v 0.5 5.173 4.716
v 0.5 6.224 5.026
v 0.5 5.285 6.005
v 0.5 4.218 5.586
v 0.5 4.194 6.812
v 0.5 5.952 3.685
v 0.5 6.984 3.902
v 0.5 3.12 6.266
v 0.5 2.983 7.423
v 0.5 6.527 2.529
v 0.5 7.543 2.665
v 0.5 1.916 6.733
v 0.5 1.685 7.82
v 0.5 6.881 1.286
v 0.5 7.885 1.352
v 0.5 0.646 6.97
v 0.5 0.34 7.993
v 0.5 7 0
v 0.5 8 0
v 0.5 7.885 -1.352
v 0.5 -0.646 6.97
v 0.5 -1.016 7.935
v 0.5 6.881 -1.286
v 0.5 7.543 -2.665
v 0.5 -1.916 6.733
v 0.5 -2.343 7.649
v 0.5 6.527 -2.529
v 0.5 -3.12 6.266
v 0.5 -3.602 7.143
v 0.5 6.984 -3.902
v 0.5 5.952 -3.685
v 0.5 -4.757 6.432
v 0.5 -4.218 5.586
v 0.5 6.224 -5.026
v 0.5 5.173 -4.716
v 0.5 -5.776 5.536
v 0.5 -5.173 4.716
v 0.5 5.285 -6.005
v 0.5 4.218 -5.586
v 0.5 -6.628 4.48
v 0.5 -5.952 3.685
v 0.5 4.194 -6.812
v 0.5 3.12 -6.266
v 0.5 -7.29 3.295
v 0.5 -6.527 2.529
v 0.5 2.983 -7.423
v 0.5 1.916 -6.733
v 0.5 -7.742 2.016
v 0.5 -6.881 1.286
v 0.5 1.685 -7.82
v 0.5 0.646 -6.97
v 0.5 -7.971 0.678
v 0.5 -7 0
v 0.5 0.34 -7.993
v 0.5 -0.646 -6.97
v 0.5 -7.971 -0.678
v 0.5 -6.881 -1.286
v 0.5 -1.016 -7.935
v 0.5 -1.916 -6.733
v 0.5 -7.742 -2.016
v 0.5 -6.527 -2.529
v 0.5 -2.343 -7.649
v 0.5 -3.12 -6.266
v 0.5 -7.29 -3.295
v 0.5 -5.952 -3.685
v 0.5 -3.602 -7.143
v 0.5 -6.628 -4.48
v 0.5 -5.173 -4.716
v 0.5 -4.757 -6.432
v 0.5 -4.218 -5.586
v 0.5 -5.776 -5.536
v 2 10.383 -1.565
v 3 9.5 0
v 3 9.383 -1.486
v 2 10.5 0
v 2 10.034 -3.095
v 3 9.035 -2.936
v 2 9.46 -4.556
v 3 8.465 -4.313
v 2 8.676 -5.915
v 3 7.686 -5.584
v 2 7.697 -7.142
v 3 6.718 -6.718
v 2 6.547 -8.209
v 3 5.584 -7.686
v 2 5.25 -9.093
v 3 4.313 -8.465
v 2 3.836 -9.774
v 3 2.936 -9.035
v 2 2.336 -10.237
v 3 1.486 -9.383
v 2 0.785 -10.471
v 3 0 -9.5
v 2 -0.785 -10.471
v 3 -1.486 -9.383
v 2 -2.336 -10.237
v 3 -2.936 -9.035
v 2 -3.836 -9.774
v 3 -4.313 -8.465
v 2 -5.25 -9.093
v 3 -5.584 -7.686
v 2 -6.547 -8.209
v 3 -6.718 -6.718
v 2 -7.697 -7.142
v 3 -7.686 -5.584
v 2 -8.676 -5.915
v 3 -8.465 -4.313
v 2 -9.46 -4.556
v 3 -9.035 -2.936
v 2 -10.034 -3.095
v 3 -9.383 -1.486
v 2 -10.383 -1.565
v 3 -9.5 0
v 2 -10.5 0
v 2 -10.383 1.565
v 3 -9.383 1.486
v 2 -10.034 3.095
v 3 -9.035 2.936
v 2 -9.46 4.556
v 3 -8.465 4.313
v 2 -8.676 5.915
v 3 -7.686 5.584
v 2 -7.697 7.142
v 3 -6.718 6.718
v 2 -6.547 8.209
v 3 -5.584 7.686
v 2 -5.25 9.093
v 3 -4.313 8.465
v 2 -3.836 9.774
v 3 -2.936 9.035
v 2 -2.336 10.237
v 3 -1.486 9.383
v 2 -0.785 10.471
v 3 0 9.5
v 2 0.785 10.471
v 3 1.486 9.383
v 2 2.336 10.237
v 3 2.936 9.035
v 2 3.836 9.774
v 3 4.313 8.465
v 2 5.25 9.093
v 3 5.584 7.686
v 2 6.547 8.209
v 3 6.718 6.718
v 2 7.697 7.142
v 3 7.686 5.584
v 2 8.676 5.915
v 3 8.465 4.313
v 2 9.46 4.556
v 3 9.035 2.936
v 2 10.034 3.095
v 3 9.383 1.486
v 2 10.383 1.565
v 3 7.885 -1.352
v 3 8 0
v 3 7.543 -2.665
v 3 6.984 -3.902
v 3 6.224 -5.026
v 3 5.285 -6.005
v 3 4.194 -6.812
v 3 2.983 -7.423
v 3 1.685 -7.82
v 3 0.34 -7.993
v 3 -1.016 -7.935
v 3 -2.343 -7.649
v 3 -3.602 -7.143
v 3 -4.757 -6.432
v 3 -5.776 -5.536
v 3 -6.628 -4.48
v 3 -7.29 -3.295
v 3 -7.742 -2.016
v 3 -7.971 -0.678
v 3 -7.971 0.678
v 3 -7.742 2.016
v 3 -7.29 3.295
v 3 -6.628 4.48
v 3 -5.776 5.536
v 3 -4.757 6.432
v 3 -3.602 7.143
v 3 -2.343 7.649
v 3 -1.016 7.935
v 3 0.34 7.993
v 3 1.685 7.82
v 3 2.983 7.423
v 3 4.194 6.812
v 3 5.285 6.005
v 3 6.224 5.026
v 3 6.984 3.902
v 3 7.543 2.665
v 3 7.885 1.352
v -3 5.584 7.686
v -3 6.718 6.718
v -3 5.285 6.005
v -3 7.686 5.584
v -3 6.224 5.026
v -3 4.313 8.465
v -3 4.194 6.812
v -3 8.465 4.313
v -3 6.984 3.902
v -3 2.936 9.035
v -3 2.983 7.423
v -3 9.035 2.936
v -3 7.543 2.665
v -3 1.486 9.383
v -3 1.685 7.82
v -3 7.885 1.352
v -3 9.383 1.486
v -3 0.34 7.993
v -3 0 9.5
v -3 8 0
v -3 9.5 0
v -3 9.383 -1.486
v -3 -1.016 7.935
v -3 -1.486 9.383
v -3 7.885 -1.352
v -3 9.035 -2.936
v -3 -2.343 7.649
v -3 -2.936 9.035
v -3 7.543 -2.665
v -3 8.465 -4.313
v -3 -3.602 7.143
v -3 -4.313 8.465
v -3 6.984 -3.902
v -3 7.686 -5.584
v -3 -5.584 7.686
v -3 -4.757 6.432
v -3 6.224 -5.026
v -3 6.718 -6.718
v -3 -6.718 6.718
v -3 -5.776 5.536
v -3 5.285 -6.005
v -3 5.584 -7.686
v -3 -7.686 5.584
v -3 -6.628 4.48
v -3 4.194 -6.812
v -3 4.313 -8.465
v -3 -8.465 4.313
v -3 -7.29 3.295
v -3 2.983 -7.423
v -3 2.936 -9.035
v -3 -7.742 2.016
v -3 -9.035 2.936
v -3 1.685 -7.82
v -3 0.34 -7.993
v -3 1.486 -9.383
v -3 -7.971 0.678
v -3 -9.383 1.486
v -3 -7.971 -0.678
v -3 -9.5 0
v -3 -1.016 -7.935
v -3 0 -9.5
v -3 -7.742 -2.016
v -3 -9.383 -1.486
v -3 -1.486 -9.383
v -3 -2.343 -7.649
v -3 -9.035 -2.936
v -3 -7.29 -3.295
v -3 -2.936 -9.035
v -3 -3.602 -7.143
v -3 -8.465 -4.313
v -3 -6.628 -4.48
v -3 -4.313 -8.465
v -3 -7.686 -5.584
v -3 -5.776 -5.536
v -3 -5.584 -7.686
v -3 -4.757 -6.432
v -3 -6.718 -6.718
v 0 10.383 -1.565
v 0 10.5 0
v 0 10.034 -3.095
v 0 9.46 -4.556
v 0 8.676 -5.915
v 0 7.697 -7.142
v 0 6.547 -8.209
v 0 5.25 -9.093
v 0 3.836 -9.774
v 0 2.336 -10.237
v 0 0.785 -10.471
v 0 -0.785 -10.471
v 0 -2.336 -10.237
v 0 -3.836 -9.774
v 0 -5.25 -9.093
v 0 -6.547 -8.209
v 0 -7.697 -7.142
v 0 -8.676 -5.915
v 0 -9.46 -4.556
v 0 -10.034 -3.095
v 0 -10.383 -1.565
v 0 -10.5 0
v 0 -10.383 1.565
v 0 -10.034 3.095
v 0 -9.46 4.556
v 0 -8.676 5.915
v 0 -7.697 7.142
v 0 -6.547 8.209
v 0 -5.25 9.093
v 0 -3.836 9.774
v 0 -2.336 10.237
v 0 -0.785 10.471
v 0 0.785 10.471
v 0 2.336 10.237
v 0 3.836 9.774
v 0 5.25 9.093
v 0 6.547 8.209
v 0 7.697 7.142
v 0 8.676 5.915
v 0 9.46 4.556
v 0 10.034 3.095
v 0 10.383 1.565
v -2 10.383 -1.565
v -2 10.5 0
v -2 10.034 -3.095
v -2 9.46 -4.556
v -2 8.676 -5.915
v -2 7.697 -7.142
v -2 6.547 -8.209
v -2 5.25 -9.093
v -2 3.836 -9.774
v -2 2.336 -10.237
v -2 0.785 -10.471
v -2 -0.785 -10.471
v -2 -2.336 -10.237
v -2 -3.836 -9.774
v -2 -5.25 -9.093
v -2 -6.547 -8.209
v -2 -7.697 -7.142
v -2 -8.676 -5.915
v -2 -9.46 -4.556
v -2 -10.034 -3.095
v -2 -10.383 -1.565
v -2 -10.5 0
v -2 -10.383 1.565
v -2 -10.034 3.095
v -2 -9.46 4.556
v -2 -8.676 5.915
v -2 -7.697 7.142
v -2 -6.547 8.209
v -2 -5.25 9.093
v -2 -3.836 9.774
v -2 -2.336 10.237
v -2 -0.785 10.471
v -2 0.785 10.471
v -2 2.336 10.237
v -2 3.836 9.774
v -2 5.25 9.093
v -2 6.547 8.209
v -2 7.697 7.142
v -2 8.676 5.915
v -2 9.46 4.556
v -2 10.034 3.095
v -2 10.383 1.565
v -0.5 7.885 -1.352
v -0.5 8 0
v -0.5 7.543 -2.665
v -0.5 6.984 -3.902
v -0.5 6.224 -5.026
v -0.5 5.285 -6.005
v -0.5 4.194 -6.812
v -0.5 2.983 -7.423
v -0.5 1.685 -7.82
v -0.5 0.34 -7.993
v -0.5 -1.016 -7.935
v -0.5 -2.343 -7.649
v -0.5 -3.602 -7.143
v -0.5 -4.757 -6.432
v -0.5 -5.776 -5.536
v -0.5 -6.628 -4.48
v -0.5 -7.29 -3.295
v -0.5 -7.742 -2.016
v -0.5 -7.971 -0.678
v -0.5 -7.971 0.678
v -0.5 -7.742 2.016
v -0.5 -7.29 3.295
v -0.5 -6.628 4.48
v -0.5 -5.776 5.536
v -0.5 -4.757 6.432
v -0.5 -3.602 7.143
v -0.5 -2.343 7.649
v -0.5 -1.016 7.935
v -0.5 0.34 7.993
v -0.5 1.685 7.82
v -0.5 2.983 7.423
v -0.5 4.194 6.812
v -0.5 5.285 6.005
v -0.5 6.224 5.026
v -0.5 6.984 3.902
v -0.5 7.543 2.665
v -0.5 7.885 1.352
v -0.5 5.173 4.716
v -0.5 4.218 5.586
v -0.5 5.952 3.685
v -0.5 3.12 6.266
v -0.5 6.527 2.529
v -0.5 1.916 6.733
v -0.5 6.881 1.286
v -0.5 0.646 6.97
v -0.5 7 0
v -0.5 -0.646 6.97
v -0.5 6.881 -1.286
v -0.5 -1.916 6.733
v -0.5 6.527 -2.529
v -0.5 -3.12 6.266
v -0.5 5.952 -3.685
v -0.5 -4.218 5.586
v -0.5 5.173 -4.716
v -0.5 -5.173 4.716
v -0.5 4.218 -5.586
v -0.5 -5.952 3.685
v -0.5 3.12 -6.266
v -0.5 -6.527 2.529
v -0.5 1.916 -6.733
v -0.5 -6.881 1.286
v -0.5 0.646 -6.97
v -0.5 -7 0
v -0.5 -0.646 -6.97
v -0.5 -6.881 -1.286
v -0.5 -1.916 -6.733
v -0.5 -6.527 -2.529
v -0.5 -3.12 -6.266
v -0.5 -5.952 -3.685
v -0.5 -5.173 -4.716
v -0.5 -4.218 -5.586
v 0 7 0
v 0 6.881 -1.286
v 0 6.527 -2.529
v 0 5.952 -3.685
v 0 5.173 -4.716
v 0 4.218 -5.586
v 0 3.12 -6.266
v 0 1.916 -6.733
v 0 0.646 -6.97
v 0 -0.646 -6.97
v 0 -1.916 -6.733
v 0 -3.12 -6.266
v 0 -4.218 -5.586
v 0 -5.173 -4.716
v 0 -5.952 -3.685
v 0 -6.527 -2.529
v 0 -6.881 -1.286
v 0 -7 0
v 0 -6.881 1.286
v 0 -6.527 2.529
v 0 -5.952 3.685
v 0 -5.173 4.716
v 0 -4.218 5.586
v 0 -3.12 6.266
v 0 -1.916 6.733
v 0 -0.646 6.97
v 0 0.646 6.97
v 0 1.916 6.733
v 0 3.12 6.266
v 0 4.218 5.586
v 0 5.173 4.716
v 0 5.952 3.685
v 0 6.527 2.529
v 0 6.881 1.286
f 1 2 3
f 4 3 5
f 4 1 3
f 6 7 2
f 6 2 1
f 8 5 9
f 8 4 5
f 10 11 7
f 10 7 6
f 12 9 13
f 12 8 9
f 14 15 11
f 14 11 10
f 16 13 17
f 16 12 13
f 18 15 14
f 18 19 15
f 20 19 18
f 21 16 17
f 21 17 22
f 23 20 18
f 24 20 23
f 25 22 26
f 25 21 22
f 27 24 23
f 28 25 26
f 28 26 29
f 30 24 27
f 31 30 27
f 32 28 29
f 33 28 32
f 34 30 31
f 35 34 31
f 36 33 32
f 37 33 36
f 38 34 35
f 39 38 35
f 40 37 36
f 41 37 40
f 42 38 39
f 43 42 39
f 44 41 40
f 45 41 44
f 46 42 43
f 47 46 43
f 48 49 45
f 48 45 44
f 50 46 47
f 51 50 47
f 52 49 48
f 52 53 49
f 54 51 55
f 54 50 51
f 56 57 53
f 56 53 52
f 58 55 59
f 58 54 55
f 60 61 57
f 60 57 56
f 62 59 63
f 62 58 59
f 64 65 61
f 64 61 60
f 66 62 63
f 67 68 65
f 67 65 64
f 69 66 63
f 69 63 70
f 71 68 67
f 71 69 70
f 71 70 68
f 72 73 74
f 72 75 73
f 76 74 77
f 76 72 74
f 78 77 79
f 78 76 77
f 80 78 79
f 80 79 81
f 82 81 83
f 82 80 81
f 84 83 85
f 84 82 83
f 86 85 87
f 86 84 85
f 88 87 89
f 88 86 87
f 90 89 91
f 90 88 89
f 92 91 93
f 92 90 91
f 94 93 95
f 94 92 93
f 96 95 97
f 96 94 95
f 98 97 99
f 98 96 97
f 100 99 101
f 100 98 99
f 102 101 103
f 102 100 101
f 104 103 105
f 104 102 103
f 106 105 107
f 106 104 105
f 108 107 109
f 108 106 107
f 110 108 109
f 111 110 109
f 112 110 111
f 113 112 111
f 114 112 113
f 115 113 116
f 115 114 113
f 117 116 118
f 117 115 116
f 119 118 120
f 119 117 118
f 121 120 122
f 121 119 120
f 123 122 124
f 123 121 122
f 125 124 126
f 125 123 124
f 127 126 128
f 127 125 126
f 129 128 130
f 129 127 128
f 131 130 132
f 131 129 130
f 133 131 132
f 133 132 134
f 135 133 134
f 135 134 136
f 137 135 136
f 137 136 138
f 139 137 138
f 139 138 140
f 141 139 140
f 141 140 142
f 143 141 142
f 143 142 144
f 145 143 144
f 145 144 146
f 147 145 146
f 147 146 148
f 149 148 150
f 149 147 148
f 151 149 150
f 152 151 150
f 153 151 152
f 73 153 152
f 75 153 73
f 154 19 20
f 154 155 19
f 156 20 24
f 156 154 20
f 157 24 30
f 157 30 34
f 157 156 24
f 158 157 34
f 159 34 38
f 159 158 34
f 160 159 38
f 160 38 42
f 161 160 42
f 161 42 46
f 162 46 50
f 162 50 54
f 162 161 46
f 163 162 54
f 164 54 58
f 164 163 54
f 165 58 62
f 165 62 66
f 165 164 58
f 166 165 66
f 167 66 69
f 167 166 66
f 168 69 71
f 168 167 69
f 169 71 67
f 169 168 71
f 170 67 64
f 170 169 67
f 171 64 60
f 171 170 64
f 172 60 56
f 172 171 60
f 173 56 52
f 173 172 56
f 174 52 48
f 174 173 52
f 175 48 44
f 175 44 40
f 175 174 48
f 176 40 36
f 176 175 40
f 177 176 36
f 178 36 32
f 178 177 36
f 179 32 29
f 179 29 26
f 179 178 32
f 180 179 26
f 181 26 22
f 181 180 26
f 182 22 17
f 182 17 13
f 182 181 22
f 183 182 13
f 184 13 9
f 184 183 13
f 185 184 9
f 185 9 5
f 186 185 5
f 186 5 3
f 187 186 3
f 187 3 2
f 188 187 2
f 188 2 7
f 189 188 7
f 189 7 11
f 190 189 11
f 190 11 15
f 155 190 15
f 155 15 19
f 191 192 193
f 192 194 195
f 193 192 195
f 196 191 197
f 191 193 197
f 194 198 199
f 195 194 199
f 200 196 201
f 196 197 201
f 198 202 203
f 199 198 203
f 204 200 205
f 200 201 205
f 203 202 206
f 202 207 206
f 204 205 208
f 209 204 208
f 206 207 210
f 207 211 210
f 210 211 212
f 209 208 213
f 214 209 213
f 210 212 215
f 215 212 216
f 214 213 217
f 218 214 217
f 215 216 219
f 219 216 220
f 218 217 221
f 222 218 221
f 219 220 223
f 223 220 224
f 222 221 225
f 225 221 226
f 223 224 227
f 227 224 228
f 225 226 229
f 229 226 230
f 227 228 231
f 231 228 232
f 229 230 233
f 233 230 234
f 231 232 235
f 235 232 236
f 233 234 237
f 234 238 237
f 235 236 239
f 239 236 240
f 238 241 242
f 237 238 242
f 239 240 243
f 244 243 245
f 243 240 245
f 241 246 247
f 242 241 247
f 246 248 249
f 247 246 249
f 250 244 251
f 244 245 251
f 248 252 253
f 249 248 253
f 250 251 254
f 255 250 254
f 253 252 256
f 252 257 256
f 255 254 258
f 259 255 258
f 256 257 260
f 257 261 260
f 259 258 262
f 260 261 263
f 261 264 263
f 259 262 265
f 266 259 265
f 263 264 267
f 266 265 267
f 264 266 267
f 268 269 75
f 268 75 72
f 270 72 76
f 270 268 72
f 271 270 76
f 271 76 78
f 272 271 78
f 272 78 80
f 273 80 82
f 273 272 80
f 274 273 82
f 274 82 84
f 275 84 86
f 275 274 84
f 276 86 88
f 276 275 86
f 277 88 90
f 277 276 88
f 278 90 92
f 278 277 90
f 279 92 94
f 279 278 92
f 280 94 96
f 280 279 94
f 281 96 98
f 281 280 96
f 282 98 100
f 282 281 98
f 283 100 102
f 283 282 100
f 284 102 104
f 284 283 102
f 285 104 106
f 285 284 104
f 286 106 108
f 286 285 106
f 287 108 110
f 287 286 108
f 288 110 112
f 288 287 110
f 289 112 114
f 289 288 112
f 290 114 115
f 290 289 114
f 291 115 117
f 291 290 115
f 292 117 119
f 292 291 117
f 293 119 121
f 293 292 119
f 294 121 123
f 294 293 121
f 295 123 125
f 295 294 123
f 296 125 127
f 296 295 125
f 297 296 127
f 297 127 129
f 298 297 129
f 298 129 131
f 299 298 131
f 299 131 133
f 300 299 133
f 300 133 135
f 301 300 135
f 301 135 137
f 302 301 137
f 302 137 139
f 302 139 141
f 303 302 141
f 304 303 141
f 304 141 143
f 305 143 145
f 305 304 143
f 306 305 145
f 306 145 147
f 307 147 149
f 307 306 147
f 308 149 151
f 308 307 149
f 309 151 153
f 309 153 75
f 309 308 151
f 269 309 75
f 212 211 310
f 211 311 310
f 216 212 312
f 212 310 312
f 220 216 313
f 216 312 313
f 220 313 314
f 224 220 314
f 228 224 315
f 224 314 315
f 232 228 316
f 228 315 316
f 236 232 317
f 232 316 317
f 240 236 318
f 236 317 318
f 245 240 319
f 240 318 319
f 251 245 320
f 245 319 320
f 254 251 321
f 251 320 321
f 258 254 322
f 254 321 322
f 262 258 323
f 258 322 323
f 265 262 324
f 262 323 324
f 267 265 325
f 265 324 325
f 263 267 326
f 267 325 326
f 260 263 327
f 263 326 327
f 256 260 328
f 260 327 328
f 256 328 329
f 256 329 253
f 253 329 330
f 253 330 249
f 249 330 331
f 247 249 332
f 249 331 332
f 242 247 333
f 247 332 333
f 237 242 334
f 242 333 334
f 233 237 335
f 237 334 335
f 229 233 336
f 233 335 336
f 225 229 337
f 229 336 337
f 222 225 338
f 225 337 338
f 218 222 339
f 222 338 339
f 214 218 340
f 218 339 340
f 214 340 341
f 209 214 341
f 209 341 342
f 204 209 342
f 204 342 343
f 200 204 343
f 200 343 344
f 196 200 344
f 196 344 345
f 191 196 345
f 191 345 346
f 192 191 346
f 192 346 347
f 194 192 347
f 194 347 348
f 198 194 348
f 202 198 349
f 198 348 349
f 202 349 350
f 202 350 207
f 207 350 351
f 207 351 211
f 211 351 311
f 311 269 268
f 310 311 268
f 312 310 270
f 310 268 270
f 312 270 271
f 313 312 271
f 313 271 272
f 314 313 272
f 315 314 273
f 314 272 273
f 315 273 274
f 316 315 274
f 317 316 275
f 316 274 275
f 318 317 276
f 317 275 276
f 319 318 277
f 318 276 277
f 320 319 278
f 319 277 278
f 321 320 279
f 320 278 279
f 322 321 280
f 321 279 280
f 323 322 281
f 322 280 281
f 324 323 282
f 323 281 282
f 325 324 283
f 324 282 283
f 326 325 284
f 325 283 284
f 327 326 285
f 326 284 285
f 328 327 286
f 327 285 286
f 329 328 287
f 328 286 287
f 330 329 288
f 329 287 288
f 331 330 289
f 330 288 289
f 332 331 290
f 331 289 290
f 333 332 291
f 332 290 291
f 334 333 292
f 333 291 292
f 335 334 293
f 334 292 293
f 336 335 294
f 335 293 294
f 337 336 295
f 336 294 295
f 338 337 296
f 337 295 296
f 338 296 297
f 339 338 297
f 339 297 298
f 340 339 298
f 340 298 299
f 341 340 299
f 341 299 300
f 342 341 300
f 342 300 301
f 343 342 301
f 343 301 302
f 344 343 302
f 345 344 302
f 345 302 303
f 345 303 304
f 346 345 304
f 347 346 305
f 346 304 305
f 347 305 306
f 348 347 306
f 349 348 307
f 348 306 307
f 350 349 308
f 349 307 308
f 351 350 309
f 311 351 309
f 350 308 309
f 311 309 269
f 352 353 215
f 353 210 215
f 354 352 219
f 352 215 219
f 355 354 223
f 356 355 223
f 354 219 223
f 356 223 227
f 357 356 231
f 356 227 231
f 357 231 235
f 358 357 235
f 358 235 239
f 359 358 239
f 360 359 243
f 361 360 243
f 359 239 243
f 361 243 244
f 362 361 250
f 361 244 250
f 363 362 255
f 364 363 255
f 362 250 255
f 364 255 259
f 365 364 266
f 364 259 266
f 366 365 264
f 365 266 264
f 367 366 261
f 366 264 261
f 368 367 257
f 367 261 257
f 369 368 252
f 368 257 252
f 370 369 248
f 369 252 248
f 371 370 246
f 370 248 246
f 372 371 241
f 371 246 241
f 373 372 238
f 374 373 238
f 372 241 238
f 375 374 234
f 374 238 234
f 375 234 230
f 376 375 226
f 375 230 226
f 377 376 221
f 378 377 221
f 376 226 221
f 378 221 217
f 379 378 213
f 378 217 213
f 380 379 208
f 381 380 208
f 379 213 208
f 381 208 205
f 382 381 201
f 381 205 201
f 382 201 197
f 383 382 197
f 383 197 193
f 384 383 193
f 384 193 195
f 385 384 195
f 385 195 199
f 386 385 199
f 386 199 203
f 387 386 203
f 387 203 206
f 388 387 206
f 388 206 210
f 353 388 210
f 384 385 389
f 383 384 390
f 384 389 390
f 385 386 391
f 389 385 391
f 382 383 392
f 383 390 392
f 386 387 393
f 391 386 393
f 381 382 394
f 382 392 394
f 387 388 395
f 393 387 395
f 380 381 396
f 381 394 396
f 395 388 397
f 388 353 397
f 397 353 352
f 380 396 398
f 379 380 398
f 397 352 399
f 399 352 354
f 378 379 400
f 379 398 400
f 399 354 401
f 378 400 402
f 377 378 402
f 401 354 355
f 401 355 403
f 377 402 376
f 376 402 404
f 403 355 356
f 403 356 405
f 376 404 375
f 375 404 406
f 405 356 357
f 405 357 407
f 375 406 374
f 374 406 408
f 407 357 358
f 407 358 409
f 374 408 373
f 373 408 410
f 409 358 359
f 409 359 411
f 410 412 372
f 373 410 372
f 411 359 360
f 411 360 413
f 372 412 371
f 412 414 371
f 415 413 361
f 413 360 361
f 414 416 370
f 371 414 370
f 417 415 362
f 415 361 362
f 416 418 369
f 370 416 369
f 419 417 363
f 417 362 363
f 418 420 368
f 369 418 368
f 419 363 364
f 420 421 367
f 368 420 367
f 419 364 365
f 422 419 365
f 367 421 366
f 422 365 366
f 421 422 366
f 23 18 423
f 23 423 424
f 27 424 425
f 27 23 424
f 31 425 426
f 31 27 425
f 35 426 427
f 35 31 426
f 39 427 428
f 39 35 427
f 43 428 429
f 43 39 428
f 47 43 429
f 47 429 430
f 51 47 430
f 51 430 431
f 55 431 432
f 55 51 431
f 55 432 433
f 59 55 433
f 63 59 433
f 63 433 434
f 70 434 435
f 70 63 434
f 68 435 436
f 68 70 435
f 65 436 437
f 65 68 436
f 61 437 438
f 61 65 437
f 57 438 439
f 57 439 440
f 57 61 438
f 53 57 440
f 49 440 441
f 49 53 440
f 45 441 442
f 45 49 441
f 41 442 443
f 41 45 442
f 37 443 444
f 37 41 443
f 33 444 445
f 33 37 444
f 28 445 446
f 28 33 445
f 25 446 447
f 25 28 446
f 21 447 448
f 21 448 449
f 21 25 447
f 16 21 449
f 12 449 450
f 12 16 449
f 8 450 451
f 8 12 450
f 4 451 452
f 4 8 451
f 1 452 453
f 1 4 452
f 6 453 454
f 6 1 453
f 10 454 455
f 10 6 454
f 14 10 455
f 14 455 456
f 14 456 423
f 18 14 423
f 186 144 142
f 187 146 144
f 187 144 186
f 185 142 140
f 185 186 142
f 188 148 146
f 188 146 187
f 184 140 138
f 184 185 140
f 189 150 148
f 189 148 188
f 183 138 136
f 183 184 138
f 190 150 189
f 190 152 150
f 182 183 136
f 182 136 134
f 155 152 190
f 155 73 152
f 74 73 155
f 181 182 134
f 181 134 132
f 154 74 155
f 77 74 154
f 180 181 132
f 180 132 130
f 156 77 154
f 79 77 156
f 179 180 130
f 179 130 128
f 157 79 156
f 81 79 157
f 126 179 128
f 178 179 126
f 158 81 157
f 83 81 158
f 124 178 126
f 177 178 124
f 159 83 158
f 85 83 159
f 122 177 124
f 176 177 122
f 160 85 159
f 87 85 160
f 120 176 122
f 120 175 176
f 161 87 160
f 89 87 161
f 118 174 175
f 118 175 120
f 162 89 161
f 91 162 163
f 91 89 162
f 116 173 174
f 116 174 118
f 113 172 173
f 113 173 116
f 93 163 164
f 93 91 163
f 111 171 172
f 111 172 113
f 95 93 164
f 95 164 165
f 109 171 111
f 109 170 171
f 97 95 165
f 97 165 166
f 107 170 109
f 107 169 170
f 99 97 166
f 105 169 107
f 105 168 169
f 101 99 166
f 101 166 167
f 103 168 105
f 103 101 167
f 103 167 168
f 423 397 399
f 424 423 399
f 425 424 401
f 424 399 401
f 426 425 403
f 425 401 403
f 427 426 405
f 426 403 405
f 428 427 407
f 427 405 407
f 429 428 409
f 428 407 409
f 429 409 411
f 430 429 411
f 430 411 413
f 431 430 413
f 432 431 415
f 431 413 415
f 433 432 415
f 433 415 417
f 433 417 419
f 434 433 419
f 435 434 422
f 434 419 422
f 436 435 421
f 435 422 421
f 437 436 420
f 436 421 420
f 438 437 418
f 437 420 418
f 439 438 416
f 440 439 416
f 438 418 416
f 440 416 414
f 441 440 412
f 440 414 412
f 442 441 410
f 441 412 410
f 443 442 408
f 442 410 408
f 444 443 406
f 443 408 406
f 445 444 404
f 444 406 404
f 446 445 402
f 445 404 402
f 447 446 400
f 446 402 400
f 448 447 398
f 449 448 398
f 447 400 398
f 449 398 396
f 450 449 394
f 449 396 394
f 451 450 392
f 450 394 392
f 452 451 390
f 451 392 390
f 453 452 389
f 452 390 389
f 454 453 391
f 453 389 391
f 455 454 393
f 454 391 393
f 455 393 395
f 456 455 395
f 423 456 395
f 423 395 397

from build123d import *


with BuildPart() as part:
    # Sketch1 → Revolve1 (revolve)
    with BuildSketch(Plane.XY):
        Polygon((0, 7), (-0.5, 7), (-0.5, 8), (-3, 8), (-3, 9.5), (-2, 10.5), (0, 10.5), align=None)
    revolve1 = revolve(axis=Axis((0, 0, 0), (-1, 0, 0)))

    # Mirror1: Revolve1 across plane
    add(revolve1.mirror(Plane(origin=(0, 10.5, 0), x_dir=(0, 0, 1), z_dir=(1, 0, 0))))


solid = part.part
